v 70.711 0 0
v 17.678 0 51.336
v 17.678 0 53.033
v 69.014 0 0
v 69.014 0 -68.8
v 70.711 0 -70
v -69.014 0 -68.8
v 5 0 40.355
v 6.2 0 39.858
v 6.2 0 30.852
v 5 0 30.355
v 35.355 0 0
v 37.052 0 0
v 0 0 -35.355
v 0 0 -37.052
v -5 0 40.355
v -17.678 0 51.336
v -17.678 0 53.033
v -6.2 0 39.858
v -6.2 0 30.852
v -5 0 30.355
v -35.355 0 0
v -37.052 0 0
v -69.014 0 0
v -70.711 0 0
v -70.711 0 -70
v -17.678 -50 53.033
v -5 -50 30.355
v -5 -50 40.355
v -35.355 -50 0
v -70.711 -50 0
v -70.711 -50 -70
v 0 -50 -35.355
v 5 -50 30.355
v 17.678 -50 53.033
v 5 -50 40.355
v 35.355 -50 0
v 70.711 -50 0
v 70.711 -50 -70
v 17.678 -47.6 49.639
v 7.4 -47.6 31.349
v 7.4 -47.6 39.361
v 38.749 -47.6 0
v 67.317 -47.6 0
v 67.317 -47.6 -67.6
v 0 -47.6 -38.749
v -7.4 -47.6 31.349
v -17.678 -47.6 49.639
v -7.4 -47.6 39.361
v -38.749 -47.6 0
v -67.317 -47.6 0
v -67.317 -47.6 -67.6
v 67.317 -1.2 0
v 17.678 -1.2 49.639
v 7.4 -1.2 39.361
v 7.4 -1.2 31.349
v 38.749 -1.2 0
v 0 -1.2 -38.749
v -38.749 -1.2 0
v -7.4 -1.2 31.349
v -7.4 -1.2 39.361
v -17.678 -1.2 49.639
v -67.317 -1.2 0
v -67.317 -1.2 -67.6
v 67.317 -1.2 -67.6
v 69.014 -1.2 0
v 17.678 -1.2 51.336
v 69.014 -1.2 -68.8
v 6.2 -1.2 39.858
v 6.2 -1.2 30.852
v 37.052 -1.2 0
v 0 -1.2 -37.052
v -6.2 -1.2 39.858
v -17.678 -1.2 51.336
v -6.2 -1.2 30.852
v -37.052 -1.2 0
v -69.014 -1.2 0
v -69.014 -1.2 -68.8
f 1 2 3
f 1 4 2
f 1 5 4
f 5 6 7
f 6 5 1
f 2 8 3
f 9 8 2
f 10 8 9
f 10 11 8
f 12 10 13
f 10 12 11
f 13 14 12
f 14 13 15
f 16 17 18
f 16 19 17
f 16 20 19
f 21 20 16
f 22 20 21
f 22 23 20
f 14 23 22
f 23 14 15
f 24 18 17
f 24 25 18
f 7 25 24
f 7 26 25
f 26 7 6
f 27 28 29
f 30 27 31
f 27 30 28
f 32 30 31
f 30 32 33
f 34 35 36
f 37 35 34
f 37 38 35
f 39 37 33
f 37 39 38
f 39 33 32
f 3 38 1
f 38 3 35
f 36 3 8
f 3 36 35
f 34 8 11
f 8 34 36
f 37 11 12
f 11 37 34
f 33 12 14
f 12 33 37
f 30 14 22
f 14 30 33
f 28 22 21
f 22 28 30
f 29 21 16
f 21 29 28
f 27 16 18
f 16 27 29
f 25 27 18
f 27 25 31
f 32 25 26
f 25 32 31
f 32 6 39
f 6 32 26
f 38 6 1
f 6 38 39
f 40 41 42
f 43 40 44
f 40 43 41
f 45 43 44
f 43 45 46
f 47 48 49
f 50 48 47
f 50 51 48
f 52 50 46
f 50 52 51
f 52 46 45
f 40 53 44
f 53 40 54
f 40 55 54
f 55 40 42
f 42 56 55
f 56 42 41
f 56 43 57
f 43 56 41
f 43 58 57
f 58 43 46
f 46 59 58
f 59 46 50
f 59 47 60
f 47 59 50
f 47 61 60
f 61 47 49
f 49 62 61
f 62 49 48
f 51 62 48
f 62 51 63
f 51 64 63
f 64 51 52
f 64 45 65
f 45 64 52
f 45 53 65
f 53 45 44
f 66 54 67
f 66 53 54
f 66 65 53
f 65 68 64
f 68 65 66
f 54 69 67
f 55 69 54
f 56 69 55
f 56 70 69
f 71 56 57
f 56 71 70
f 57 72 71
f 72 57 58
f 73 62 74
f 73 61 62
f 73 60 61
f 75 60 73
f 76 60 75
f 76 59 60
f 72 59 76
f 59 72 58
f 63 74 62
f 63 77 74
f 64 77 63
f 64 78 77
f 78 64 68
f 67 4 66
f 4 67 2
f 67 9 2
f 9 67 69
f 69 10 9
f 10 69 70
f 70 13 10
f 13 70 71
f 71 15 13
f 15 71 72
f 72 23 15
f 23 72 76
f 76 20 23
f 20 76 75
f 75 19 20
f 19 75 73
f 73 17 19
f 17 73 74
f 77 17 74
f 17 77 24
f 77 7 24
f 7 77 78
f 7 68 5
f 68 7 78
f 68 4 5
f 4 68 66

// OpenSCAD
dummy=0.1;

inner = 50;
outer = 100;
width = 50;
height = 70;
upper_cut = 10;
thickness = 1.2;

/*
translate([0,0,0])
difference() {
	union() {
		rotate([0,45,0]) cube([outer,width,outer], center=true);
		translate([0,0,-outer/2]) cube([sqrt(2)*outer,width,outer], center=true);
	}
	rotate([0,45,0]) cube([inner,width+2*dummy,inner], center=true);
	translate([0,0,sqrt(2)*inner/2+sqrt(2)*(outer-inner)/4+sqrt(2)*dummy/2]) {
		rotate([0,45,0]) cube([(outer-inner)/2+dummy,width+2*dummy,(outer-inner)/2+dummy], center=true);
		cube([upper_cut,width+2*dummy,sqrt(2)*(outer-inner)], center=true);
	}
}
*/

module case() {
	difference() {
		shape(inner, outer, height, width, upper_cut, 0);
		translate([0,0,0])
			shape(inner+4*thickness, outer-4*thickness, height-2*thickness, width-2*thickness, upper_cut+4*thickness, 2*thickness);
		translate([0,width-thickness,0])
			shape(inner+2*thickness, outer-2*thickness, height-thickness, width, upper_cut+2*thickness, thickness);
	}
}

module lid() {
	clearance = 0.2;
	shape(inner+2*(thickness+clearance), outer-2*(thickness-clearance), height-(thickness+clearance), thickness, upper_cut+2*(thickness+clearance), thickness+clearance);
}

module shape(inner, outer, height, width, upper_cut, t=1) {
	rotate([90,0,0]) linear_extrude(height=width)
		polygon([
			[0,-inner*sqrt(2)/2],
			[inner*sqrt(2)/2,0],
			[upper_cut/2,inner*sqrt(2)/2-upper_cut/2], 
			[upper_cut/2,inner*sqrt(2)/2+upper_cut/2-2*t*sqrt(2)], 
			[(outer-inner)*sqrt(2)/4+sqrt(2)*t, outer*sqrt(2)/2-(outer-inner)/2*sqrt(2)/2-sqrt(2)*t],
			[outer*sqrt(2)/2, 0],
			[outer*sqrt(2)/2, -height],
////			[0, -height],
			[-outer*sqrt(2)/2, -height],
			[-outer*sqrt(2)/2, 0],
			[-(outer-inner)*sqrt(2)/4-sqrt(2)*t, outer*sqrt(2)/2-(outer-inner)/2*sqrt(2)/2-sqrt(2)*t],
			[-upper_cut/2,inner*sqrt(2)/2+upper_cut/2-2*t*sqrt(2)], 
			[-upper_cut/2,inner*sqrt(2)/2-upper_cut/2], 
			[-inner*sqrt(2)/2,0],
		]);
}

//lid();
case();
